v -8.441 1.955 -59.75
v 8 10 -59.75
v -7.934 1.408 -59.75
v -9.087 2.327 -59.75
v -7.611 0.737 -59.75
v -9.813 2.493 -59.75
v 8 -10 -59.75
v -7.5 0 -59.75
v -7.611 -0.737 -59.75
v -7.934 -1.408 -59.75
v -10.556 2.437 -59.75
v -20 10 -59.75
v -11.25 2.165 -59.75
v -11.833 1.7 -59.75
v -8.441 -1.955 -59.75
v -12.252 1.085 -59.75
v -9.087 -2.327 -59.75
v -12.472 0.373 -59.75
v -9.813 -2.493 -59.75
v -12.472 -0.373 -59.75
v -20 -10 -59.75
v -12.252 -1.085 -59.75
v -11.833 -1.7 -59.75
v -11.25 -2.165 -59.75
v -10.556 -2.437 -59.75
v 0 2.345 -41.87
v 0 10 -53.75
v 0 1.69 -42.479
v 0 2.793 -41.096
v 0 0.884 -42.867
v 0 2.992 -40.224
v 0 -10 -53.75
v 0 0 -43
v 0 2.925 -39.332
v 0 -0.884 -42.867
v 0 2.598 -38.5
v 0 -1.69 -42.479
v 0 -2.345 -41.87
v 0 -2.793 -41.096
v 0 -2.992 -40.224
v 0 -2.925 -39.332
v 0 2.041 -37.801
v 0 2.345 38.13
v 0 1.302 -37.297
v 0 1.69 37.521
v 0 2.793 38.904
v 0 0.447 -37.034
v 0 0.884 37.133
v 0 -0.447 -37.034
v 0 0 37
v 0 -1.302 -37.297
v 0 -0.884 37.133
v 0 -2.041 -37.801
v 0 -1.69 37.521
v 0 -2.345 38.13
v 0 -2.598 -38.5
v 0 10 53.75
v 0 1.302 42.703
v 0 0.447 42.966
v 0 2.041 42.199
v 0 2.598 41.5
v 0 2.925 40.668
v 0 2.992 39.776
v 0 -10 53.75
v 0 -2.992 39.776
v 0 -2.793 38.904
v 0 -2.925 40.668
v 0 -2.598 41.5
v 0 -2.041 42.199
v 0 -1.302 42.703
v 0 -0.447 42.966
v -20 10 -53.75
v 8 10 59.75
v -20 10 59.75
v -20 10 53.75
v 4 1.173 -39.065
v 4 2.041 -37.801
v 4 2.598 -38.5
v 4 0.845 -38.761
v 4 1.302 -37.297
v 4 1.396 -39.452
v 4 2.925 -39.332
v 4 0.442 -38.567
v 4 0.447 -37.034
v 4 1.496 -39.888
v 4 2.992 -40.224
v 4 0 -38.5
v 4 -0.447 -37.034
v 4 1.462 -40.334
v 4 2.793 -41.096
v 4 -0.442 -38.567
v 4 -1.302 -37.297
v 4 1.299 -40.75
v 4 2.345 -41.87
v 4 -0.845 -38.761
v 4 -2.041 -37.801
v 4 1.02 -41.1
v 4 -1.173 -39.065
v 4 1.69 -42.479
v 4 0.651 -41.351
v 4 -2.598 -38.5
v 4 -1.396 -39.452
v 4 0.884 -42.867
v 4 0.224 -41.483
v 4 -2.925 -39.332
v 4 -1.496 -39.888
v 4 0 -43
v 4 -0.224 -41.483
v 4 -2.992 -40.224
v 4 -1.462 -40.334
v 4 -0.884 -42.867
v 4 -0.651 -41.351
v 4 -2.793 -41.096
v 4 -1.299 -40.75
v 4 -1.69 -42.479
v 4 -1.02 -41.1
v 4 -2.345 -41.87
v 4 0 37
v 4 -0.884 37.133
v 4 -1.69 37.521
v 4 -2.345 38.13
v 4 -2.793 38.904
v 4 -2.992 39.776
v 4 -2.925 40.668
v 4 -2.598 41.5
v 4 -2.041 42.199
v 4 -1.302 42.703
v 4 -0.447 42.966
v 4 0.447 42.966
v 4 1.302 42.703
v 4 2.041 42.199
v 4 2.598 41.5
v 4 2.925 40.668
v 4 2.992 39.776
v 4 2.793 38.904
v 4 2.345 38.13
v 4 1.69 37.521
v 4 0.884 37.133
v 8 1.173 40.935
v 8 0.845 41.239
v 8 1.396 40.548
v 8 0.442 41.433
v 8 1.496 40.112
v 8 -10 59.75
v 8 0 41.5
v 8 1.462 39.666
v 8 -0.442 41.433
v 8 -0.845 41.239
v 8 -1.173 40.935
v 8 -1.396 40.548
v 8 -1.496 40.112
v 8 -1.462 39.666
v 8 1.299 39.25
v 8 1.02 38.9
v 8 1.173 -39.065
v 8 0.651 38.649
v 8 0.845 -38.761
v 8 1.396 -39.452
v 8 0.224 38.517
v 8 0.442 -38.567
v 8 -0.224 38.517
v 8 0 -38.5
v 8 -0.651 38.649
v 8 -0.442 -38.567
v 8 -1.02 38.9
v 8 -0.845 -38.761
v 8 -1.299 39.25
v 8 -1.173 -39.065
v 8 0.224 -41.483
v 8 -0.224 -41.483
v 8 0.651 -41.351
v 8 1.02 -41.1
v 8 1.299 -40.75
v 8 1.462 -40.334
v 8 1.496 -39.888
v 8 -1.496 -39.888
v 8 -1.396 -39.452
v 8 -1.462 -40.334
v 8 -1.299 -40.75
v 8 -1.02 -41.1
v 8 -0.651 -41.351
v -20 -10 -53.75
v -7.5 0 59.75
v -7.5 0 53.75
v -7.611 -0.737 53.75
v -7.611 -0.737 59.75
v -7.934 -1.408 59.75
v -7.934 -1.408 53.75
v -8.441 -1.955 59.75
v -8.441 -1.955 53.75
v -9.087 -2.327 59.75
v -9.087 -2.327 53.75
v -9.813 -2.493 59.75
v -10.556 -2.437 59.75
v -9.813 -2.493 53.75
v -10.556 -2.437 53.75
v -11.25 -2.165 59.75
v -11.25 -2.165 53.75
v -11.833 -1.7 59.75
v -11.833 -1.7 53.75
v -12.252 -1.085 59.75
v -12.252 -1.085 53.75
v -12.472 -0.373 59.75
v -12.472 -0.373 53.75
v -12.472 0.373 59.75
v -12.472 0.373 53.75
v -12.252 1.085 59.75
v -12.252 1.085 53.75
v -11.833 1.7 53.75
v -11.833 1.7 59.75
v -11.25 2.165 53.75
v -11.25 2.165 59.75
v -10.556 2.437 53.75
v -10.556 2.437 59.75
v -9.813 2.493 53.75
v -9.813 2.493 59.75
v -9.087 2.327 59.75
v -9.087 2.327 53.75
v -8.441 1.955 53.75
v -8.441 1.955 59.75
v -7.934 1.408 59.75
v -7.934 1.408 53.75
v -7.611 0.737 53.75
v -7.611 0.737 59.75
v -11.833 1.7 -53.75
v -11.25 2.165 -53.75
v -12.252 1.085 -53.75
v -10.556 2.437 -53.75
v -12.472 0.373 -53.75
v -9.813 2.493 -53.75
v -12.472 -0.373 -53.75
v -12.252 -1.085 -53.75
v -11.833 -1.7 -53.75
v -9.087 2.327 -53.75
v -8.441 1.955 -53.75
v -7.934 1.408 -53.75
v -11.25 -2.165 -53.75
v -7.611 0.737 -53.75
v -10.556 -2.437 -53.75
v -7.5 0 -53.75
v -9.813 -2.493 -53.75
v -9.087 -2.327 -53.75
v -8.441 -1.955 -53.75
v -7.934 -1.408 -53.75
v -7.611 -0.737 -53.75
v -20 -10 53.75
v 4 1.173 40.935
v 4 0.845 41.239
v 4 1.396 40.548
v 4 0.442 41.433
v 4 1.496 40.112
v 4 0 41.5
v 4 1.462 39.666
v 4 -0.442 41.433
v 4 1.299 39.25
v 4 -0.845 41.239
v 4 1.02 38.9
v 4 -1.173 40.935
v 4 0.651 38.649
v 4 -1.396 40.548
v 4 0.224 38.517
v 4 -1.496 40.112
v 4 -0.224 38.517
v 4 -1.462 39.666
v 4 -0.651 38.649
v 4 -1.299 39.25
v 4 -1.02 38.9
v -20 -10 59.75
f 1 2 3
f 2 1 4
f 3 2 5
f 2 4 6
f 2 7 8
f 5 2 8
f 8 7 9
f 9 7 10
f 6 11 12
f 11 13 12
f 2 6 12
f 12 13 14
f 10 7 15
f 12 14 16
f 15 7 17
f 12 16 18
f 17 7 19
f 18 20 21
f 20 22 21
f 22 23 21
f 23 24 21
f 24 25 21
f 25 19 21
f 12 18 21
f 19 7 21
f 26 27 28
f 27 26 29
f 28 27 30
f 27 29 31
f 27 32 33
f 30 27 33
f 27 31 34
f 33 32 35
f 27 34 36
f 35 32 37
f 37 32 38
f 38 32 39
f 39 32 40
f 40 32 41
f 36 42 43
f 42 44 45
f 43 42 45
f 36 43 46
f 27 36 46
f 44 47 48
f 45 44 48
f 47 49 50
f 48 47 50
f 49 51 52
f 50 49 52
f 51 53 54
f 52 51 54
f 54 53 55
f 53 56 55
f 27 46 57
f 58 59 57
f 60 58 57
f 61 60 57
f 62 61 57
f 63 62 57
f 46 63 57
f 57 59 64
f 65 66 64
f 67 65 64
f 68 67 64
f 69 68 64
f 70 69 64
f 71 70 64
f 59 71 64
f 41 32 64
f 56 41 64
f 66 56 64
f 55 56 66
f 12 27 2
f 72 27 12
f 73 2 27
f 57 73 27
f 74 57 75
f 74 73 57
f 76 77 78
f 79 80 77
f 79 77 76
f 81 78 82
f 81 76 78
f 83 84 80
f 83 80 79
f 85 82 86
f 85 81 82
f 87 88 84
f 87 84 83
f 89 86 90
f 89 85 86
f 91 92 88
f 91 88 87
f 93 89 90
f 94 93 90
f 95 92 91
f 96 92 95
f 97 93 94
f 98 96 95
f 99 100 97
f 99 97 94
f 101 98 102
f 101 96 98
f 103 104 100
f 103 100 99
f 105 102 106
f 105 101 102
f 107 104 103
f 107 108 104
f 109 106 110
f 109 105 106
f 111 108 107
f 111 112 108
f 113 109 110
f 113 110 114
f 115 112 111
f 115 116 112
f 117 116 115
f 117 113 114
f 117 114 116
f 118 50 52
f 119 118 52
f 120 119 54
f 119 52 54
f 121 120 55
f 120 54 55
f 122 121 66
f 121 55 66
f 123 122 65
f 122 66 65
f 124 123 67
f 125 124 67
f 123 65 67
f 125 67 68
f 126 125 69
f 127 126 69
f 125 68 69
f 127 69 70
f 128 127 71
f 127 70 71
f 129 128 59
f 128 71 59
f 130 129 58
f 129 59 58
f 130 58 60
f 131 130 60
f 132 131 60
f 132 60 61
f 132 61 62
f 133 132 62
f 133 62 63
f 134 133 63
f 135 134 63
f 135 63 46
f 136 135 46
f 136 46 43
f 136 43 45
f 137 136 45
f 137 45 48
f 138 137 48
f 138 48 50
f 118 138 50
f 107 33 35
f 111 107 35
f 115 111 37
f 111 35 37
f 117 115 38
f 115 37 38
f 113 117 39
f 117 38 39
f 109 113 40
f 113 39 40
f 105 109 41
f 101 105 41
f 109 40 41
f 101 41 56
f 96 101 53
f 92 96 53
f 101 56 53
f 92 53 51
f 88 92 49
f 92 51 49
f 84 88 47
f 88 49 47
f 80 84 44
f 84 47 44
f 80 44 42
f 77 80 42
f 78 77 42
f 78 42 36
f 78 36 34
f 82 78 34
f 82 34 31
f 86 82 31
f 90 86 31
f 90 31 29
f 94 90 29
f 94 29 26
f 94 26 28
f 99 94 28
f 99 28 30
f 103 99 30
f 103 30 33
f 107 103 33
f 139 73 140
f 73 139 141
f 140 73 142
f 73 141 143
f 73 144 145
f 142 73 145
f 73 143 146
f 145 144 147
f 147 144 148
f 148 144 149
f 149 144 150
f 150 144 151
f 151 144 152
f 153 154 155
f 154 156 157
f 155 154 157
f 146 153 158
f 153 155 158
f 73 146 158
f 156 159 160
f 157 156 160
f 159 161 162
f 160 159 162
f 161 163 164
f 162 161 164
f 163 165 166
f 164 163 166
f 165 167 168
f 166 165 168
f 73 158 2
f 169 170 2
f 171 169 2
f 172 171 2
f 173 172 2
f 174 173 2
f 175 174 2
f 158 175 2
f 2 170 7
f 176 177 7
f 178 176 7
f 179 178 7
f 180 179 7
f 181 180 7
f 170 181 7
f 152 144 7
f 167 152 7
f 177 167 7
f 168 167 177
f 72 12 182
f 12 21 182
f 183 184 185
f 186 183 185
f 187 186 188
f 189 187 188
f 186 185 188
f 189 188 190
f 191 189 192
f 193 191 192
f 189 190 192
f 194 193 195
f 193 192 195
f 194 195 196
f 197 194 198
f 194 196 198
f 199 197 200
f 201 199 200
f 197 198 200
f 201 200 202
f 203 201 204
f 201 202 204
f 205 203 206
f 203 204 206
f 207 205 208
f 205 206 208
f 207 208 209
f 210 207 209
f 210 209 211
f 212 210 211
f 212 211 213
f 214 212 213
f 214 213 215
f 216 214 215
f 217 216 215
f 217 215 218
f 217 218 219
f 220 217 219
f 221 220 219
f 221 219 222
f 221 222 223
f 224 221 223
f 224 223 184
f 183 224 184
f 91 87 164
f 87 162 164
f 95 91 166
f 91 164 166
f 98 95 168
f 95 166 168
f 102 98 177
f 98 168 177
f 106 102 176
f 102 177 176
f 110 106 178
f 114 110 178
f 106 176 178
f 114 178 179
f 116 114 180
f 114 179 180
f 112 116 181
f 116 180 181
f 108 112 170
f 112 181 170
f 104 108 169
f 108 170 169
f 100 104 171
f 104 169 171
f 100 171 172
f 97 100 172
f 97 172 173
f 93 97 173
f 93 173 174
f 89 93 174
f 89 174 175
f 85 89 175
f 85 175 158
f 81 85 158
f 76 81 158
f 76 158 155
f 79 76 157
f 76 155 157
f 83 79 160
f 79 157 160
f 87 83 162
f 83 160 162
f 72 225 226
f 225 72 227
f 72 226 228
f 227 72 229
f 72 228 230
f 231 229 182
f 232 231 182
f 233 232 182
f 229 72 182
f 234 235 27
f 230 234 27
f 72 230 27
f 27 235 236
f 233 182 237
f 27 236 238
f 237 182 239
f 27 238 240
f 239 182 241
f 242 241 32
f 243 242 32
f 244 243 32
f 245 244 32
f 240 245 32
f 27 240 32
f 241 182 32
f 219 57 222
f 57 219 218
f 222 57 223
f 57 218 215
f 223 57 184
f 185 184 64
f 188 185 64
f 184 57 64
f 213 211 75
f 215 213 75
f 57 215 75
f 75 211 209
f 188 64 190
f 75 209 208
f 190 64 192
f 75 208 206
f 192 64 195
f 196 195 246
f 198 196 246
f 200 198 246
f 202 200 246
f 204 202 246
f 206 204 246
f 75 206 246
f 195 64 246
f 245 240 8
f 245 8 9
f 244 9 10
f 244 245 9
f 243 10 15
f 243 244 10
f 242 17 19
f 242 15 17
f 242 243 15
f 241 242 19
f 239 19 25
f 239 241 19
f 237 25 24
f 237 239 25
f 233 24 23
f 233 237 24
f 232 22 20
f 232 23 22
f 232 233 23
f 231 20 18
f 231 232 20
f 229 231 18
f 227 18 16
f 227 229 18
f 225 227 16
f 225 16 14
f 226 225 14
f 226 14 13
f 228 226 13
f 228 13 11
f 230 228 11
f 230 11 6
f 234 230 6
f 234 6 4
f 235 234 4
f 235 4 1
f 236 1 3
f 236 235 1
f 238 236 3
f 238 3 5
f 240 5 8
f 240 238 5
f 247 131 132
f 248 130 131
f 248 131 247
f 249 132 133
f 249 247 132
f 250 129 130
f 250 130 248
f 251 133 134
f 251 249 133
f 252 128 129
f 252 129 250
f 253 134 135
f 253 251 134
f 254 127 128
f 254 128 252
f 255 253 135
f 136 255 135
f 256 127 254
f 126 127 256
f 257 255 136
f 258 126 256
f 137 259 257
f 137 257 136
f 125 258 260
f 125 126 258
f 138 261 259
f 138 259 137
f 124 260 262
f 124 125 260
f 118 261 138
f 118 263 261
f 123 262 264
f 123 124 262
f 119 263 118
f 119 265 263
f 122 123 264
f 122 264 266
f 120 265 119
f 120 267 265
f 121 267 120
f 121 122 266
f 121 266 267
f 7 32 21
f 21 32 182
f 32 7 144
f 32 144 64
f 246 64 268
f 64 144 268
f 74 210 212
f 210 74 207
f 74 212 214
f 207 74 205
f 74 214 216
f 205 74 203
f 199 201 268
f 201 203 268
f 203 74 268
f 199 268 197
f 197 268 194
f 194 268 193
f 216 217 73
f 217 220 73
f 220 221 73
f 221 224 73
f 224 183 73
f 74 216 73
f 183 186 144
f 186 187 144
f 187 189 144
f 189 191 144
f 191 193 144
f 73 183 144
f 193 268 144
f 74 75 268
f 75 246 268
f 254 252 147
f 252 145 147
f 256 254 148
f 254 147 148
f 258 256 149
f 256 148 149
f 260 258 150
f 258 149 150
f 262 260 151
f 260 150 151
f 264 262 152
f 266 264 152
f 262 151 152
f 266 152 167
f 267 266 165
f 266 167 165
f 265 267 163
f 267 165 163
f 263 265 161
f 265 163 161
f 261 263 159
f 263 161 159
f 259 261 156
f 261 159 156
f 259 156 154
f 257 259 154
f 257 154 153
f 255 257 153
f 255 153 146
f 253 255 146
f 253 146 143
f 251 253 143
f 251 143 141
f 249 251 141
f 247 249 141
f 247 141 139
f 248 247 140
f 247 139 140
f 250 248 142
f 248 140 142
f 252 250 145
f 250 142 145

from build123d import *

# Parameters (mm, degrees)
PAD003_DEPTH        = 10
HOLE004_D           = 3
HOLE004_DEPTH       = 25
HOLE004_CBORE_D     = 6
HOLE004_CBORE_DEPTH = 4
SKETCH009_R         = 2.5
POCKET_DEPTH        = 6.001
POCKET_DEPTH_BACK   = 113.501


with BuildPart() as part:
    # Sketch007 → Pad003 (new body, symmetric)
    with BuildSketch(Plane.XZ):
        Polygon((0, 53.75), (-20, 53.75), (-20, 59.75), (8, 59.75), (8, -59.75), (-20, -59.75), (-20, -53.75), (0, -53.75), align=None)
    extrude(amount=PAD003_DEPTH, both=True)

    # Hole004
    with Locations(Plane(origin=(0, 0, 0), x_dir=(0, 0, -1), z_dir=(-1, 0, 0))):
        with Locations((-40, 0), (40, 0)):
            CounterBoreHole(HOLE004_D / 2, HOLE004_CBORE_D / 2, HOLE004_CBORE_DEPTH, depth=HOLE004_DEPTH)

    # Sketch009 (on Face1 of Hole004) → Pocket (cut, two sides)
    with BuildSketch(Plane(origin=(0, 0, 53.75), x_dir=(1, 0, 0), z_dir=(0, 0, -1))) as pocket_sk:
        with Locations((-10, 0)):
            Circle(SKETCH009_R)
    extrude(amount=-POCKET_DEPTH, mode=Mode.SUBTRACT)
    extrude(pocket_sk.sketch, amount=POCKET_DEPTH_BACK, mode=Mode.SUBTRACT)


solid = part.part
